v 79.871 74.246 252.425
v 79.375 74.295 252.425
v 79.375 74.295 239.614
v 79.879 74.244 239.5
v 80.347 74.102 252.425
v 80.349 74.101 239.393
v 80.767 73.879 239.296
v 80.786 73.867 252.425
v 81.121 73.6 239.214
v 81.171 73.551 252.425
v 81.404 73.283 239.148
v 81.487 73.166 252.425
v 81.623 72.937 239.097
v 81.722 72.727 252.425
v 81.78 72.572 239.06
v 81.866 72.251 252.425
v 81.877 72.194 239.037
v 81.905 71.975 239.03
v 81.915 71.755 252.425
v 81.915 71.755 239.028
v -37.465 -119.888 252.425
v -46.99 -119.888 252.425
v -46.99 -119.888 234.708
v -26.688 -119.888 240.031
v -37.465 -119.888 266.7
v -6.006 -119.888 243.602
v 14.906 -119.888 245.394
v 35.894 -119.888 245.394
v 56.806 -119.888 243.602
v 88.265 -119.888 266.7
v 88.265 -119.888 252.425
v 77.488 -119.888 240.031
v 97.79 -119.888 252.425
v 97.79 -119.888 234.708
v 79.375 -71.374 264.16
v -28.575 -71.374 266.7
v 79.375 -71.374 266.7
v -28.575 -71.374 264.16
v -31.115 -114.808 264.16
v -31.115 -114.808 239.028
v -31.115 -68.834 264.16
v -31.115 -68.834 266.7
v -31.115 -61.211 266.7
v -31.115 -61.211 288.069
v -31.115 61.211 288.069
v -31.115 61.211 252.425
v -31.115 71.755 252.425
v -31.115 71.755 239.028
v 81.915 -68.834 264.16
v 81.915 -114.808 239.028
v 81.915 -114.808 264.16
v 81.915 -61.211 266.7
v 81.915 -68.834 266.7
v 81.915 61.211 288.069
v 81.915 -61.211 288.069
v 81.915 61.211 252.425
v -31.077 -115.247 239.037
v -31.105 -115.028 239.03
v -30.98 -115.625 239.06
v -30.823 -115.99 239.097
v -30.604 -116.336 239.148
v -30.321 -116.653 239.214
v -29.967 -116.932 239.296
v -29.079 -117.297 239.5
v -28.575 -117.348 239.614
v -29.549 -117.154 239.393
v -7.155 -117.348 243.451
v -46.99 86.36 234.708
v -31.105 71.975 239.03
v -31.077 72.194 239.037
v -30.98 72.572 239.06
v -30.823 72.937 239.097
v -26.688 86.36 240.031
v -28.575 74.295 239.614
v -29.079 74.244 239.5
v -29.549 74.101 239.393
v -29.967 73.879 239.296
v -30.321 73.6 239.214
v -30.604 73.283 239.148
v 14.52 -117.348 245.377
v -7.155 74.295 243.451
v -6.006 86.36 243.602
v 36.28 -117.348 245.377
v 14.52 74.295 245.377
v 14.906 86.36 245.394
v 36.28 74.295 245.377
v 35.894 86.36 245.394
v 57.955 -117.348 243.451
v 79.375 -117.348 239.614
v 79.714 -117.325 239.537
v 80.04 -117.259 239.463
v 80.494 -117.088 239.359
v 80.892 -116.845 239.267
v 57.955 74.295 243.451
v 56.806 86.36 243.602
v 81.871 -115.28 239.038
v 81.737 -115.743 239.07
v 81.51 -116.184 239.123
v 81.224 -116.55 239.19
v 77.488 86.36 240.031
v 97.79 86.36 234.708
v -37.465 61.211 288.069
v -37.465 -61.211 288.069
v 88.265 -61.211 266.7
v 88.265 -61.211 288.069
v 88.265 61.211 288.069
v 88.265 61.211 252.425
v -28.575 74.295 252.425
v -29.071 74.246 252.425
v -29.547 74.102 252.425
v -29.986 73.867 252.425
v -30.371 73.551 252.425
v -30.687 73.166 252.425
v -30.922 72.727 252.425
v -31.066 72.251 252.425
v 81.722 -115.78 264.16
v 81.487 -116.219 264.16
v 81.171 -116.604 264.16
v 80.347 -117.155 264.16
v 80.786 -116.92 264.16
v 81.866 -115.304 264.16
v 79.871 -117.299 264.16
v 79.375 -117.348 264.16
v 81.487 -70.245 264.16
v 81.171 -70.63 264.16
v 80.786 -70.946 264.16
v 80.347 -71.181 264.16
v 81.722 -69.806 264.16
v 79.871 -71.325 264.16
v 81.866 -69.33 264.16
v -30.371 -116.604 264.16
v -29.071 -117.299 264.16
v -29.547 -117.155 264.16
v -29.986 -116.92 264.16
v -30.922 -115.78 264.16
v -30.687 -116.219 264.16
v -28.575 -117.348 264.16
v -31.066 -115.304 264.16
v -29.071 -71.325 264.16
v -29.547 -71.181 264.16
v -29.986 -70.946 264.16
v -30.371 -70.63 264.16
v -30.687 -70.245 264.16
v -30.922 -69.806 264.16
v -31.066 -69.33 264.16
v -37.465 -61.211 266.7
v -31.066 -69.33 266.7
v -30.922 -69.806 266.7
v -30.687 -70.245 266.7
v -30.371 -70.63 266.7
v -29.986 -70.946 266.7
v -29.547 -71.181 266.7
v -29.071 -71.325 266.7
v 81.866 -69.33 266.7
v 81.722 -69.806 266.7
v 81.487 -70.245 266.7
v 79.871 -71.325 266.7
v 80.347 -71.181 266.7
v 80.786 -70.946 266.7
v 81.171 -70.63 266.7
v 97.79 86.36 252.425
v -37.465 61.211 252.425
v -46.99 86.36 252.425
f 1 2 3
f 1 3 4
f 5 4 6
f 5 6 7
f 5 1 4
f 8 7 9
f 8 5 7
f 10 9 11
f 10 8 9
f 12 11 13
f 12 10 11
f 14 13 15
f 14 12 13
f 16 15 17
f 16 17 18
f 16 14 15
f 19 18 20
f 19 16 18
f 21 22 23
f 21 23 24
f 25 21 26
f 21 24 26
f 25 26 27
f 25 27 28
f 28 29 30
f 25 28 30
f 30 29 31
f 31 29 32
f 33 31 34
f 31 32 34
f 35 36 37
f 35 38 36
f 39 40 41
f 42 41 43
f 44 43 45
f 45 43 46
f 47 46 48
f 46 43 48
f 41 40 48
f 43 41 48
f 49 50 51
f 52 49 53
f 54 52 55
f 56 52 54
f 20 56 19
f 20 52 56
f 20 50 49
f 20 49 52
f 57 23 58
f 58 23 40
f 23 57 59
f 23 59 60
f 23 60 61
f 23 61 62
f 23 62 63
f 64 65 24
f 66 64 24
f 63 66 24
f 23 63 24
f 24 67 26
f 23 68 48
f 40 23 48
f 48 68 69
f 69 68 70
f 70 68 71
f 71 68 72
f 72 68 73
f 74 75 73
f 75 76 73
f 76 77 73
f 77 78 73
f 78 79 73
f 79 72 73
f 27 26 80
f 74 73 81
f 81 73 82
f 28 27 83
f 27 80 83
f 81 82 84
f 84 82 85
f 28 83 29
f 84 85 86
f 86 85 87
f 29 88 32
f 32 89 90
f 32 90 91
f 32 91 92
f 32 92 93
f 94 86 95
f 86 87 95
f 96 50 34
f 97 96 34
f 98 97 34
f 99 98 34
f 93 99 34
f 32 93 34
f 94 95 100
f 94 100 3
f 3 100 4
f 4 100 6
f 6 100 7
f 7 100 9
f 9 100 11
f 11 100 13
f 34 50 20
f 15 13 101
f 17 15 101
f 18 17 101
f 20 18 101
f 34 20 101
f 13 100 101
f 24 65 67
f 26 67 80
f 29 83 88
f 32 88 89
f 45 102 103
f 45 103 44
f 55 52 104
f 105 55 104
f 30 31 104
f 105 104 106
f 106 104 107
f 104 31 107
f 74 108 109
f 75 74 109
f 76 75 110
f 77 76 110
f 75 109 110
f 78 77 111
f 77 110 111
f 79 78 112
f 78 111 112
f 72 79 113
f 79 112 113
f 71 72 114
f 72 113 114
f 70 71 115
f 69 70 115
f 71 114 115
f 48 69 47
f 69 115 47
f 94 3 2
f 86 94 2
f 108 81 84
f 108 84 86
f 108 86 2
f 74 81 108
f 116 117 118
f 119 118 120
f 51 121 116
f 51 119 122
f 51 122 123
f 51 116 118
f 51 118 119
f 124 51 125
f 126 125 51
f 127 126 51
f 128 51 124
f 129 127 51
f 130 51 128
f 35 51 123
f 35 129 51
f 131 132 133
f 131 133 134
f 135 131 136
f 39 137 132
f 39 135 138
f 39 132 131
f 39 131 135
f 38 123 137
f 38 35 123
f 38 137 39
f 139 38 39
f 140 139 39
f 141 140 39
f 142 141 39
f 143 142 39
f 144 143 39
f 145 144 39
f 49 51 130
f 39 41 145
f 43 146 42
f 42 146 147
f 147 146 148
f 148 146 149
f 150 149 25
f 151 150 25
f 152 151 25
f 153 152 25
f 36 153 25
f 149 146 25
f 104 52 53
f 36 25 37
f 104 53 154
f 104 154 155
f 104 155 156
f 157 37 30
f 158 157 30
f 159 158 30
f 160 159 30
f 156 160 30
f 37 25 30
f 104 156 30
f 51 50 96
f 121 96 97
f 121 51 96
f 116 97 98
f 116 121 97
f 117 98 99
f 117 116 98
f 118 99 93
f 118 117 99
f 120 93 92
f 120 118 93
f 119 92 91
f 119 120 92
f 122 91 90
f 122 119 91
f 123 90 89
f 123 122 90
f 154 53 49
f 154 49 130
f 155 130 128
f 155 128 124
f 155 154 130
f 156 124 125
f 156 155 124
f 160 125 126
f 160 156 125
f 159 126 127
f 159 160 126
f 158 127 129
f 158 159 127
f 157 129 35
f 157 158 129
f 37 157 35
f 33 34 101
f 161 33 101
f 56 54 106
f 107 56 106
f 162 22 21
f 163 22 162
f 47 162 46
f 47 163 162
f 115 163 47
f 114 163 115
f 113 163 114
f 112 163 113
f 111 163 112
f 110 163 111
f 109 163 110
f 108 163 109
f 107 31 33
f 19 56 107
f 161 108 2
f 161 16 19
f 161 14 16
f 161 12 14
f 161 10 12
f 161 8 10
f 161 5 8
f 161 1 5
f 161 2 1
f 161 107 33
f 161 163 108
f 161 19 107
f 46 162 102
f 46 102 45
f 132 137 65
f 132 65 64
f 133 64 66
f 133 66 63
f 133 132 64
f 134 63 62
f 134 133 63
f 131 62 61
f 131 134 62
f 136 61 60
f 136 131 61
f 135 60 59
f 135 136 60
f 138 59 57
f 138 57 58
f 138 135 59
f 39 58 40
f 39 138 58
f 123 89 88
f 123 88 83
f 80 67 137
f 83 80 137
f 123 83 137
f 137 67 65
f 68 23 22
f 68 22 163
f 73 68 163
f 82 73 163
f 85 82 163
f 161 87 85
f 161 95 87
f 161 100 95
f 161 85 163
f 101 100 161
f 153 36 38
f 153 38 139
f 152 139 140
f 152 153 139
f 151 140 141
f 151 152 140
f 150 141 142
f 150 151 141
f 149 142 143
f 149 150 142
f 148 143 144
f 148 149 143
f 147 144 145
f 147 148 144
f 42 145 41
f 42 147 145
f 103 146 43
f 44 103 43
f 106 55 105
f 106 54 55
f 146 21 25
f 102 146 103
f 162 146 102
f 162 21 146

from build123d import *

# Parameters (mm, degrees)
SKETCH1_W           = 144.78
SKETCH1_H           = 206.248
EXTRUDE1_DEPTH      = 252.4252
SKETCH7_W           = 125.73
SKETCH7_H           = 196.723
EXTRUDE5_DEPTH      = 35.64418
EXTRUDE2_DEPTH      = 42.08
EXTRUDE2_DEPTH_BACK = 273.8502
SKETCH4_W           = 113.03
SKETCH4_H           = 142.748
SKETCH10_W          = 113.03
SKETCH10_H          = 2.921
SKETCH10_H_2        = 45.974
EXTRUDE8_DEPTH      = 264.16
SKETCH11_W          = 113.03
SKETCH11_H          = 2.921
EXTRUDE9_DEPTH      = 21.59
FILLET1_R           = 2.54
SKETCH2_R           = 245.618
EXTRUDE4_DEPTH      = 230
SKETCH12_W          = 125.73
SKETCH12_H          = 43.053
EXTRUDE10_DEPTH     = 21.36938
SKETCH14_W          = 132.74265683
SKETCH14_H          = 39.732066683
CUT_EXTRUDE1_DEPTH  = 15.623999994
SKETCH15_W          = 144.34776975
SKETCH15_H          = 23.27915683
CUT_EXTRUDE2_DEPTH  = 15.623999994


with BuildPart() as part:
    # Sketch1 → Extrude1 (new body)
    with BuildSketch(Plane.XY):
        with Locations((25.4, -16.764)):
            Rectangle(SKETCH1_W, SKETCH1_H)
    extrude(amount=EXTRUDE1_DEPTH)

    # Sketch7 → Extrude5 (add)
    with BuildSketch(Plane.XY.offset(252.4252)):
        with Locations((25.4, -21.5265)):
            Rectangle(SKETCH7_W, SKETCH7_H)
    extrude(amount=EXTRUDE5_DEPTH)

    # Sketch4 → Extrude2 (cut, two sides: drawn at the far end of the back side and taken through both)
    with BuildSketch(Plane.XY.offset(252.4252).offset(-EXTRUDE2_DEPTH_BACK)):
        with Locations((25.4, 0)):
            Rectangle(SKETCH4_W, SKETCH4_H)
    extrude(amount=EXTRUDE2_DEPTH + EXTRUDE2_DEPTH_BACK, mode=Mode.SUBTRACT)

    # Sketch10 → Extrude8 (cut)
    with BuildSketch(Plane(origin=(0, 0, 0), x_dir=(-1, 0, 0), z_dir=(0, 0, -1))):
        with Locations((-25.4, 72.8345)):
            Rectangle(SKETCH10_W, SKETCH10_H)
        with Locations((-25.4, -94.361)):
            Rectangle(SKETCH10_W, SKETCH10_H_2)
    extrude(amount=-EXTRUDE8_DEPTH, mode=Mode.SUBTRACT)

    # Sketch11 → Extrude9 (cut)
    with BuildSketch(Plane(origin=(0, 0, 264.16), x_dir=(-1, 0, 0), z_dir=(0, 0, -1))):
        with Locations((-25.4, 72.8345)):
            Rectangle(SKETCH11_W, SKETCH11_H)
    extrude(amount=-EXTRUDE9_DEPTH, mode=Mode.SUBTRACT)

    # Fillet1
    fillet1_edges = [part.edges().sort_by_distance(p)[0] for p in [
        (-31.115, 71.374, 286.90969),
        (-31.115, -71.374, 276.11469),
        (81.915, -71.374, 276.11469),
        (81.915, 71.374, 286.90969),
        (81.915, 74.295, 142.875),
        (-31.115, 74.295, 142.875),
        (81.915, -117.348, 132.08),
        (-31.115, -117.348, 132.08),
    ]]
    fillet(fillet1_edges, radius=FILLET1_R)

    # Sketch2 → Extrude4 (cut)
    with BuildSketch(Plane(origin=(0, 86.36, 0), x_dir=(-1, 0, 0), z_dir=(0, 1, 0))):
        with Locations((-25.4, 0)):
            Circle(SKETCH2_R)
    extrude(amount=-EXTRUDE4_DEPTH, mode=Mode.SUBTRACT)

    # Sketch12 → Extrude10 (cut)
    with BuildSketch(Plane.XY.offset(288.06938)):
        with Locations((25.4, -98.3615)):
            Rectangle(SKETCH12_W, SKETCH12_H)
    extrude(amount=-EXTRUDE10_DEPTH, mode=Mode.SUBTRACT)

    # Sketch14 → Cut-Extrude1 (cut)
    with BuildSketch(Plane(origin=(0, 76.835, 0), x_dir=(1, 0, 0), z_dir=(0, 1, 0))):
        with Locations((21.893671585, -272.291233342)):
            Rectangle(SKETCH14_W, SKETCH14_H)
    extrude(amount=-CUT_EXTRUDE1_DEPTH, mode=Mode.SUBTRACT)

    # Sketch15 → Cut-Extrude2 (cut)
    with BuildSketch(Plane.XZ.offset(76.835)):
        with Locations((25.85194999, 278.339578415)):
            Rectangle(SKETCH15_W, SKETCH15_H)
    extrude(amount=-CUT_EXTRUDE2_DEPTH, mode=Mode.SUBTRACT)


solid = part.part
